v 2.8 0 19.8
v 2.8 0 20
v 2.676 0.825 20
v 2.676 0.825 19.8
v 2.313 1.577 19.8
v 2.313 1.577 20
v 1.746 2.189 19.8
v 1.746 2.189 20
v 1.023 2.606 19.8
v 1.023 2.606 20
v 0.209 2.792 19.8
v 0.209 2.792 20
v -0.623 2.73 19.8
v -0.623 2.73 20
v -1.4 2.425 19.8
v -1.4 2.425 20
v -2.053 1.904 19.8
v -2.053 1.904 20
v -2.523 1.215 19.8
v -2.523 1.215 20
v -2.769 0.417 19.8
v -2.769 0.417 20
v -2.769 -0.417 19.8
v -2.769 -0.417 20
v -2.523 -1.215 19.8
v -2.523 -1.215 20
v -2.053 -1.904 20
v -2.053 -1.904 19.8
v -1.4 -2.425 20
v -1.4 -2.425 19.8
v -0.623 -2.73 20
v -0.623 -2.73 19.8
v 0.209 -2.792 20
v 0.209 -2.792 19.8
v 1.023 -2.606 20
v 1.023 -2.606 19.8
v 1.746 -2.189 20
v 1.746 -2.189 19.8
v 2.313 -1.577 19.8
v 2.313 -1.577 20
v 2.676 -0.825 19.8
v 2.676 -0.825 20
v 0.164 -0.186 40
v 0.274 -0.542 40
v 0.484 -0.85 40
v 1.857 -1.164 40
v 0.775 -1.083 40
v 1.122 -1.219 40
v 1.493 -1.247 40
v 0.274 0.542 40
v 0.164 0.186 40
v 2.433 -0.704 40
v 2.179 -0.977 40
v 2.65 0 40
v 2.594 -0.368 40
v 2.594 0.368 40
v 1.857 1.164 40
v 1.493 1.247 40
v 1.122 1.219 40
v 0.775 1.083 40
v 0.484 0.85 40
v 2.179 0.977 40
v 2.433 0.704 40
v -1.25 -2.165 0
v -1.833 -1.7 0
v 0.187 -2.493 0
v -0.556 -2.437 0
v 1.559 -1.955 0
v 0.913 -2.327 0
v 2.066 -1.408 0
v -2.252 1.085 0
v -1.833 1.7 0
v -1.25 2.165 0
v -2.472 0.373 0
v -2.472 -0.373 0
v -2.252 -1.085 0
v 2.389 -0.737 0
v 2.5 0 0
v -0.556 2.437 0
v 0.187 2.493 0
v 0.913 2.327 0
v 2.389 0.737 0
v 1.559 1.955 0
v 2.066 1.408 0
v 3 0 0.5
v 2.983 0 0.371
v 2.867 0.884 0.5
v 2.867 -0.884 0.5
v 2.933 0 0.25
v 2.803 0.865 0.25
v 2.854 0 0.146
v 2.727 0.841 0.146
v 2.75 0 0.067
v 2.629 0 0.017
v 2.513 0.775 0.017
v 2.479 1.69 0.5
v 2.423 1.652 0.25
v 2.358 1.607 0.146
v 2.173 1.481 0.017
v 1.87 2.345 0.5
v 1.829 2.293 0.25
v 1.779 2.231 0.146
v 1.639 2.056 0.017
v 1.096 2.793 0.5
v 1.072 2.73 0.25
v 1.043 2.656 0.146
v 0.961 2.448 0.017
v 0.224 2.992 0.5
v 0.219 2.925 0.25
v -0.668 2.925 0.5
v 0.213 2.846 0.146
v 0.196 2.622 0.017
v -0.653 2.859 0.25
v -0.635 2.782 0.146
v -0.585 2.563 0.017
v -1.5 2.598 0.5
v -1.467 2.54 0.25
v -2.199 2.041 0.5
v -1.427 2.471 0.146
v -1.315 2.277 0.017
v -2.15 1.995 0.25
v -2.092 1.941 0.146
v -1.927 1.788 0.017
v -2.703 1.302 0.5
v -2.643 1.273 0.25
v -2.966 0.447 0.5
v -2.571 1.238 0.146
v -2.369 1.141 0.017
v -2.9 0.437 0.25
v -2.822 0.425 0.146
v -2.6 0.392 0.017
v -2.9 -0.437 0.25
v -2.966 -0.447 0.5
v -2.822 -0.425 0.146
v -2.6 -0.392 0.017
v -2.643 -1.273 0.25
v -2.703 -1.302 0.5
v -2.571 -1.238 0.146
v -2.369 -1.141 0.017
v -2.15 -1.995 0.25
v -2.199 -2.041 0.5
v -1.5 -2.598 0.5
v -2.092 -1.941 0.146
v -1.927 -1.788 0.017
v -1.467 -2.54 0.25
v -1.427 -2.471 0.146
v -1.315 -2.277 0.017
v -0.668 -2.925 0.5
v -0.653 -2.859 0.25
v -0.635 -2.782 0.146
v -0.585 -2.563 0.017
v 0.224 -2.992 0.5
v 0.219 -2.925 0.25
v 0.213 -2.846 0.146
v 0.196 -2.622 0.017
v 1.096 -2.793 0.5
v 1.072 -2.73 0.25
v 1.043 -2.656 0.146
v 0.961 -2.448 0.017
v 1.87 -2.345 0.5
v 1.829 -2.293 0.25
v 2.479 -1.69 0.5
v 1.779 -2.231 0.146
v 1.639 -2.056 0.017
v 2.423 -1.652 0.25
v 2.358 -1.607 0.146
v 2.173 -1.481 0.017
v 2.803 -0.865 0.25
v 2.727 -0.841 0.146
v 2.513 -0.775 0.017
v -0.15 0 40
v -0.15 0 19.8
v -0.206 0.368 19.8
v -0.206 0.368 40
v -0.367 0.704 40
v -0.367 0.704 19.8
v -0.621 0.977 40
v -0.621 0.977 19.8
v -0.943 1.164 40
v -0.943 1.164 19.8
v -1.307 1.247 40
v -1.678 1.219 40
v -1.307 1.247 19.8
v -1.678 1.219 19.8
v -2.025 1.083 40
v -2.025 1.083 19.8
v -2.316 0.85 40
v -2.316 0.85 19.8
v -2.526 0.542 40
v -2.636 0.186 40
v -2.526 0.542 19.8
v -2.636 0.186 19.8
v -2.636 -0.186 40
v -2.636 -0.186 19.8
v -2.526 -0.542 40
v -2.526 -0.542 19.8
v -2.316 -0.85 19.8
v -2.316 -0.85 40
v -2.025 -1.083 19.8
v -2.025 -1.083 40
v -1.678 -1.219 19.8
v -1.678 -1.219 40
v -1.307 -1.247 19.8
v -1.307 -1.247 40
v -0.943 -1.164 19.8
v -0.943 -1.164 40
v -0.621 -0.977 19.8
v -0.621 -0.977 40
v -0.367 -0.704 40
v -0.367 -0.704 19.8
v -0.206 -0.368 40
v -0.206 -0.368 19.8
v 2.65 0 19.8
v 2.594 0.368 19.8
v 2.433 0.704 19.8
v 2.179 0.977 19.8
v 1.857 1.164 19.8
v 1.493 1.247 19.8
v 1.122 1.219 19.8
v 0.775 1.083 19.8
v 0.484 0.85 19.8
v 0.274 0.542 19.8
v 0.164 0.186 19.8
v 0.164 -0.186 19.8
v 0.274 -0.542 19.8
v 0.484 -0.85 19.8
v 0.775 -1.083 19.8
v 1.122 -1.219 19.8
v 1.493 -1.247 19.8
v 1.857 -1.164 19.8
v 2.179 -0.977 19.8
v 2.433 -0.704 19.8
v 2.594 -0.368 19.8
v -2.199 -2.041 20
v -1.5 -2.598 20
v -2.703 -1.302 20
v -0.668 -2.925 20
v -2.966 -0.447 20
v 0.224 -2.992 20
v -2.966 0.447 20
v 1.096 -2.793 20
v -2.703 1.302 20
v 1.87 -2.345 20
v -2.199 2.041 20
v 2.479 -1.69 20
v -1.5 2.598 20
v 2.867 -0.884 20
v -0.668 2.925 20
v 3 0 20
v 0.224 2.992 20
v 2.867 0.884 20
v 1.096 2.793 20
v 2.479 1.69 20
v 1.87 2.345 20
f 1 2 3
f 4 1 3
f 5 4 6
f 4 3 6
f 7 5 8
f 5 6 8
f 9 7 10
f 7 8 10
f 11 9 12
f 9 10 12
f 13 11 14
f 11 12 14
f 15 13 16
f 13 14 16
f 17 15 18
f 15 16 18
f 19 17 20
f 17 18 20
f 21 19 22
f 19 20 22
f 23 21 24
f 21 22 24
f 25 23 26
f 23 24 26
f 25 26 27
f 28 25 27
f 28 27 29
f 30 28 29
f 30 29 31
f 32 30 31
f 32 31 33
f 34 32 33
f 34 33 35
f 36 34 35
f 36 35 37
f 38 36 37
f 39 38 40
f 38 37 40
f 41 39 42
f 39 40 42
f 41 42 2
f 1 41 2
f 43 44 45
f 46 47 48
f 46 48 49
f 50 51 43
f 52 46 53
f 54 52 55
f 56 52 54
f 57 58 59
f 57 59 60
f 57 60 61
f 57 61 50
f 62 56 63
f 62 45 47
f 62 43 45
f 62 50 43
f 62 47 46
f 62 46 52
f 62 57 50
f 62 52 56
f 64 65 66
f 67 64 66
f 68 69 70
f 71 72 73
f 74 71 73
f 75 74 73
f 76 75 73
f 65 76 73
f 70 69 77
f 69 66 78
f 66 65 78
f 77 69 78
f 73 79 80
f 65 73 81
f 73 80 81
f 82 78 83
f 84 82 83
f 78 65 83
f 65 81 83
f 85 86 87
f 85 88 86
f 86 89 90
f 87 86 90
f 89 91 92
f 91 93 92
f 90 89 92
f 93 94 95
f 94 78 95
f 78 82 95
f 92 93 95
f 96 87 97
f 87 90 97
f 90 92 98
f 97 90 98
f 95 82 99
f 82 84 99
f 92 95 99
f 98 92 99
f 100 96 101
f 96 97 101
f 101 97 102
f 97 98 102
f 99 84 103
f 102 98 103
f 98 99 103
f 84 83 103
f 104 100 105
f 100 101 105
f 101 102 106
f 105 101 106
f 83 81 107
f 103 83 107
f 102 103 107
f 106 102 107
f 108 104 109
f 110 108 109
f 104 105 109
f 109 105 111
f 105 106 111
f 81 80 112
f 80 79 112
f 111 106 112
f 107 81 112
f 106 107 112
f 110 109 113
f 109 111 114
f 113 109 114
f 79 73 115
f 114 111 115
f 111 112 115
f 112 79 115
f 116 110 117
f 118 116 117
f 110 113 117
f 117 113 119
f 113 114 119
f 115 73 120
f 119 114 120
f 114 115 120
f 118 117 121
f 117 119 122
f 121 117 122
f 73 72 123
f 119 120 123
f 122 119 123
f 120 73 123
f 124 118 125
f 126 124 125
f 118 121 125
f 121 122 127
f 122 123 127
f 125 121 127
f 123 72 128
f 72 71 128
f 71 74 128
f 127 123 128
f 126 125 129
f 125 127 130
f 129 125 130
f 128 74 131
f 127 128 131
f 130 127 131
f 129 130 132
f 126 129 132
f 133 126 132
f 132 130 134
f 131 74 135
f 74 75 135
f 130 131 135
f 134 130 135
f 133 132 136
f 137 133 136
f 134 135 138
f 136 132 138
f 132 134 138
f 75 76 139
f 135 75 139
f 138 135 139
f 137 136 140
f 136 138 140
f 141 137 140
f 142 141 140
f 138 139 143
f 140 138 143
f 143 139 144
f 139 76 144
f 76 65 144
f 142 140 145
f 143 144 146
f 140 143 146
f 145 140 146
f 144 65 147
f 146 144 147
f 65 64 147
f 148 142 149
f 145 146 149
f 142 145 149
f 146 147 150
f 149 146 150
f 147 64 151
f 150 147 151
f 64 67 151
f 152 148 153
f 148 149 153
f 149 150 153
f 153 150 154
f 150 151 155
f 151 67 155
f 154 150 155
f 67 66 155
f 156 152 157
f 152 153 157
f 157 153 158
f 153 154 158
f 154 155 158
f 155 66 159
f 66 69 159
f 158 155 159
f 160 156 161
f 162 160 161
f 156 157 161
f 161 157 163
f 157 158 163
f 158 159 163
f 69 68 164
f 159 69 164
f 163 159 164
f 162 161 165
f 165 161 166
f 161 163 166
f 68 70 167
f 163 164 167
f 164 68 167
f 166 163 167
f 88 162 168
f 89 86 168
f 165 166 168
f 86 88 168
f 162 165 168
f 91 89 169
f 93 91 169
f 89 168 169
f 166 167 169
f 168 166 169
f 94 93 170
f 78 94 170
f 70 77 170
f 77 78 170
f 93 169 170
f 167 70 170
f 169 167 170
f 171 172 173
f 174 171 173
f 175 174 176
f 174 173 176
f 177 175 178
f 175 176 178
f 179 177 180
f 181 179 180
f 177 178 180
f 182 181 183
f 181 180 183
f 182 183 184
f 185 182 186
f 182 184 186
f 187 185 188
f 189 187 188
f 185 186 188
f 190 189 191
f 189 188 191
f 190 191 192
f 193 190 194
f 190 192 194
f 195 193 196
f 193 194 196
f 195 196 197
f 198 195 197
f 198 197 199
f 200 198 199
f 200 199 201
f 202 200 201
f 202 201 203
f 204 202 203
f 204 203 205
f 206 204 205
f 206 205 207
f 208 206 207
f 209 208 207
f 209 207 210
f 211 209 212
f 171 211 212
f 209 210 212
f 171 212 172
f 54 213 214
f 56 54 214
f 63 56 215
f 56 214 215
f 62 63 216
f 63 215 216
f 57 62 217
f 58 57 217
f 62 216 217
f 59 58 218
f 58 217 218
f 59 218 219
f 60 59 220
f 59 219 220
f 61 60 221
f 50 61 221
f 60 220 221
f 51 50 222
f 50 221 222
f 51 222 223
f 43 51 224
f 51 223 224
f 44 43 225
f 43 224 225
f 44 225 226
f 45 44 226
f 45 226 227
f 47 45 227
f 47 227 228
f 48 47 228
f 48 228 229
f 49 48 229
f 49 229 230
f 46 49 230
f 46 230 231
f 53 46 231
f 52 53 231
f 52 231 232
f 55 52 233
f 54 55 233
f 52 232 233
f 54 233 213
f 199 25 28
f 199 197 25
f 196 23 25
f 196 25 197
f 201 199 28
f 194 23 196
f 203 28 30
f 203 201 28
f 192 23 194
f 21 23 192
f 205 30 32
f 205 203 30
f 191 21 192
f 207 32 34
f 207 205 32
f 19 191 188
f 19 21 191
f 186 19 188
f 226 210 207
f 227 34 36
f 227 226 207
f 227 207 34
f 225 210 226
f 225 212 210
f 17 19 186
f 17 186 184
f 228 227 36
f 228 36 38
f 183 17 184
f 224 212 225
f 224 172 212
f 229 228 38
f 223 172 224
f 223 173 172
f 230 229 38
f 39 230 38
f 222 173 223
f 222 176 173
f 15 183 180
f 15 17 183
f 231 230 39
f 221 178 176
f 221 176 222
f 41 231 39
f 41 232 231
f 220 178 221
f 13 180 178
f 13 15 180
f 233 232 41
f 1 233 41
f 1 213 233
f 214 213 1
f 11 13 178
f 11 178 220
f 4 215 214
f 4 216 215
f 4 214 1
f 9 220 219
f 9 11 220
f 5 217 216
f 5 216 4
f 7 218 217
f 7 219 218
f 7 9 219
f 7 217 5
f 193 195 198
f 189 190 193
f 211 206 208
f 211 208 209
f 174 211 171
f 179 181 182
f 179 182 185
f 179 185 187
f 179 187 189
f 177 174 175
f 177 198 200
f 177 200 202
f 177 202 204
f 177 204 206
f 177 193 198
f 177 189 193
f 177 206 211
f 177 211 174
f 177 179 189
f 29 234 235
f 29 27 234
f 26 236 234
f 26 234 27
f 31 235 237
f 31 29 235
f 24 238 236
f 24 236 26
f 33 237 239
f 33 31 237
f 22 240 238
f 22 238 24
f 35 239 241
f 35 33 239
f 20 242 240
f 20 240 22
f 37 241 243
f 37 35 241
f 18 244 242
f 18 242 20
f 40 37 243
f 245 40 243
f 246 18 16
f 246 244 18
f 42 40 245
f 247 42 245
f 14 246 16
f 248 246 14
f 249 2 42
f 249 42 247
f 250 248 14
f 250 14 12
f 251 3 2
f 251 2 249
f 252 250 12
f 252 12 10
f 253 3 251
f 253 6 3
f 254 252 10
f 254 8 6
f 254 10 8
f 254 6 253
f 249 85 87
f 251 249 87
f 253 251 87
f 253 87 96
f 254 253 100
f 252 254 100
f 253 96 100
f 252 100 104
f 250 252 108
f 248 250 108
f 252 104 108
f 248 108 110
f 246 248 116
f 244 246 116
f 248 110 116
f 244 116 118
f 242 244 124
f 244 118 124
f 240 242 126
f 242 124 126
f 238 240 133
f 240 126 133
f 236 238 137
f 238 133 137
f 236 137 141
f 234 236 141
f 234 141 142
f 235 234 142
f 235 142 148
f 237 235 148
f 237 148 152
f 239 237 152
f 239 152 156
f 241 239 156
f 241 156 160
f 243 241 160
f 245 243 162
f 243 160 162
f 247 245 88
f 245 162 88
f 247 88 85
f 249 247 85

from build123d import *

# Parameters (mm, degrees)
ESQUISSE2_R             = 3
BOSS_EXTRU_1_DEPTH      = 20
CONG_1_R                = 0.5
ESQUISSE3_R             = 2.8
ENL_V_MAT_EXTRU_1_DEPTH = 0.2
ESQUISSE4_R             = 1.25
BOSS_EXTRU_2_DEPTH      = 20.2


with BuildPart() as part:
    # Esquisse2 → Boss.-Extru.1 (new body)
    with BuildSketch(Plane.XY):
        Circle(ESQUISSE2_R)
    extrude(amount=BOSS_EXTRU_1_DEPTH)

    # Congé1
    cong_1_edges = [part.edges().sort_by_distance(p)[0] for p in [
        (-3, 0, 0),
    ]]
    fillet(cong_1_edges, radius=CONG_1_R)

    # Esquisse3 → Enlèv. mat.-Extru.1 (cut)
    with BuildSketch(Plane.XY.offset(20)):
        Circle(ESQUISSE3_R)
    extrude(amount=-ENL_V_MAT_EXTRU_1_DEPTH, mode=Mode.SUBTRACT)

    # Esquisse4 → Boss.-Extru.2 (add)
    with BuildSketch(Plane.XY.offset(19.8)):
        with Locations((-1.4, 0)):
            Circle(ESQUISSE4_R)
        with Locations((1.4, 0)):
            Circle(ESQUISSE4_R)
    extrude(amount=BOSS_EXTRU_2_DEPTH)


solid = part.part
